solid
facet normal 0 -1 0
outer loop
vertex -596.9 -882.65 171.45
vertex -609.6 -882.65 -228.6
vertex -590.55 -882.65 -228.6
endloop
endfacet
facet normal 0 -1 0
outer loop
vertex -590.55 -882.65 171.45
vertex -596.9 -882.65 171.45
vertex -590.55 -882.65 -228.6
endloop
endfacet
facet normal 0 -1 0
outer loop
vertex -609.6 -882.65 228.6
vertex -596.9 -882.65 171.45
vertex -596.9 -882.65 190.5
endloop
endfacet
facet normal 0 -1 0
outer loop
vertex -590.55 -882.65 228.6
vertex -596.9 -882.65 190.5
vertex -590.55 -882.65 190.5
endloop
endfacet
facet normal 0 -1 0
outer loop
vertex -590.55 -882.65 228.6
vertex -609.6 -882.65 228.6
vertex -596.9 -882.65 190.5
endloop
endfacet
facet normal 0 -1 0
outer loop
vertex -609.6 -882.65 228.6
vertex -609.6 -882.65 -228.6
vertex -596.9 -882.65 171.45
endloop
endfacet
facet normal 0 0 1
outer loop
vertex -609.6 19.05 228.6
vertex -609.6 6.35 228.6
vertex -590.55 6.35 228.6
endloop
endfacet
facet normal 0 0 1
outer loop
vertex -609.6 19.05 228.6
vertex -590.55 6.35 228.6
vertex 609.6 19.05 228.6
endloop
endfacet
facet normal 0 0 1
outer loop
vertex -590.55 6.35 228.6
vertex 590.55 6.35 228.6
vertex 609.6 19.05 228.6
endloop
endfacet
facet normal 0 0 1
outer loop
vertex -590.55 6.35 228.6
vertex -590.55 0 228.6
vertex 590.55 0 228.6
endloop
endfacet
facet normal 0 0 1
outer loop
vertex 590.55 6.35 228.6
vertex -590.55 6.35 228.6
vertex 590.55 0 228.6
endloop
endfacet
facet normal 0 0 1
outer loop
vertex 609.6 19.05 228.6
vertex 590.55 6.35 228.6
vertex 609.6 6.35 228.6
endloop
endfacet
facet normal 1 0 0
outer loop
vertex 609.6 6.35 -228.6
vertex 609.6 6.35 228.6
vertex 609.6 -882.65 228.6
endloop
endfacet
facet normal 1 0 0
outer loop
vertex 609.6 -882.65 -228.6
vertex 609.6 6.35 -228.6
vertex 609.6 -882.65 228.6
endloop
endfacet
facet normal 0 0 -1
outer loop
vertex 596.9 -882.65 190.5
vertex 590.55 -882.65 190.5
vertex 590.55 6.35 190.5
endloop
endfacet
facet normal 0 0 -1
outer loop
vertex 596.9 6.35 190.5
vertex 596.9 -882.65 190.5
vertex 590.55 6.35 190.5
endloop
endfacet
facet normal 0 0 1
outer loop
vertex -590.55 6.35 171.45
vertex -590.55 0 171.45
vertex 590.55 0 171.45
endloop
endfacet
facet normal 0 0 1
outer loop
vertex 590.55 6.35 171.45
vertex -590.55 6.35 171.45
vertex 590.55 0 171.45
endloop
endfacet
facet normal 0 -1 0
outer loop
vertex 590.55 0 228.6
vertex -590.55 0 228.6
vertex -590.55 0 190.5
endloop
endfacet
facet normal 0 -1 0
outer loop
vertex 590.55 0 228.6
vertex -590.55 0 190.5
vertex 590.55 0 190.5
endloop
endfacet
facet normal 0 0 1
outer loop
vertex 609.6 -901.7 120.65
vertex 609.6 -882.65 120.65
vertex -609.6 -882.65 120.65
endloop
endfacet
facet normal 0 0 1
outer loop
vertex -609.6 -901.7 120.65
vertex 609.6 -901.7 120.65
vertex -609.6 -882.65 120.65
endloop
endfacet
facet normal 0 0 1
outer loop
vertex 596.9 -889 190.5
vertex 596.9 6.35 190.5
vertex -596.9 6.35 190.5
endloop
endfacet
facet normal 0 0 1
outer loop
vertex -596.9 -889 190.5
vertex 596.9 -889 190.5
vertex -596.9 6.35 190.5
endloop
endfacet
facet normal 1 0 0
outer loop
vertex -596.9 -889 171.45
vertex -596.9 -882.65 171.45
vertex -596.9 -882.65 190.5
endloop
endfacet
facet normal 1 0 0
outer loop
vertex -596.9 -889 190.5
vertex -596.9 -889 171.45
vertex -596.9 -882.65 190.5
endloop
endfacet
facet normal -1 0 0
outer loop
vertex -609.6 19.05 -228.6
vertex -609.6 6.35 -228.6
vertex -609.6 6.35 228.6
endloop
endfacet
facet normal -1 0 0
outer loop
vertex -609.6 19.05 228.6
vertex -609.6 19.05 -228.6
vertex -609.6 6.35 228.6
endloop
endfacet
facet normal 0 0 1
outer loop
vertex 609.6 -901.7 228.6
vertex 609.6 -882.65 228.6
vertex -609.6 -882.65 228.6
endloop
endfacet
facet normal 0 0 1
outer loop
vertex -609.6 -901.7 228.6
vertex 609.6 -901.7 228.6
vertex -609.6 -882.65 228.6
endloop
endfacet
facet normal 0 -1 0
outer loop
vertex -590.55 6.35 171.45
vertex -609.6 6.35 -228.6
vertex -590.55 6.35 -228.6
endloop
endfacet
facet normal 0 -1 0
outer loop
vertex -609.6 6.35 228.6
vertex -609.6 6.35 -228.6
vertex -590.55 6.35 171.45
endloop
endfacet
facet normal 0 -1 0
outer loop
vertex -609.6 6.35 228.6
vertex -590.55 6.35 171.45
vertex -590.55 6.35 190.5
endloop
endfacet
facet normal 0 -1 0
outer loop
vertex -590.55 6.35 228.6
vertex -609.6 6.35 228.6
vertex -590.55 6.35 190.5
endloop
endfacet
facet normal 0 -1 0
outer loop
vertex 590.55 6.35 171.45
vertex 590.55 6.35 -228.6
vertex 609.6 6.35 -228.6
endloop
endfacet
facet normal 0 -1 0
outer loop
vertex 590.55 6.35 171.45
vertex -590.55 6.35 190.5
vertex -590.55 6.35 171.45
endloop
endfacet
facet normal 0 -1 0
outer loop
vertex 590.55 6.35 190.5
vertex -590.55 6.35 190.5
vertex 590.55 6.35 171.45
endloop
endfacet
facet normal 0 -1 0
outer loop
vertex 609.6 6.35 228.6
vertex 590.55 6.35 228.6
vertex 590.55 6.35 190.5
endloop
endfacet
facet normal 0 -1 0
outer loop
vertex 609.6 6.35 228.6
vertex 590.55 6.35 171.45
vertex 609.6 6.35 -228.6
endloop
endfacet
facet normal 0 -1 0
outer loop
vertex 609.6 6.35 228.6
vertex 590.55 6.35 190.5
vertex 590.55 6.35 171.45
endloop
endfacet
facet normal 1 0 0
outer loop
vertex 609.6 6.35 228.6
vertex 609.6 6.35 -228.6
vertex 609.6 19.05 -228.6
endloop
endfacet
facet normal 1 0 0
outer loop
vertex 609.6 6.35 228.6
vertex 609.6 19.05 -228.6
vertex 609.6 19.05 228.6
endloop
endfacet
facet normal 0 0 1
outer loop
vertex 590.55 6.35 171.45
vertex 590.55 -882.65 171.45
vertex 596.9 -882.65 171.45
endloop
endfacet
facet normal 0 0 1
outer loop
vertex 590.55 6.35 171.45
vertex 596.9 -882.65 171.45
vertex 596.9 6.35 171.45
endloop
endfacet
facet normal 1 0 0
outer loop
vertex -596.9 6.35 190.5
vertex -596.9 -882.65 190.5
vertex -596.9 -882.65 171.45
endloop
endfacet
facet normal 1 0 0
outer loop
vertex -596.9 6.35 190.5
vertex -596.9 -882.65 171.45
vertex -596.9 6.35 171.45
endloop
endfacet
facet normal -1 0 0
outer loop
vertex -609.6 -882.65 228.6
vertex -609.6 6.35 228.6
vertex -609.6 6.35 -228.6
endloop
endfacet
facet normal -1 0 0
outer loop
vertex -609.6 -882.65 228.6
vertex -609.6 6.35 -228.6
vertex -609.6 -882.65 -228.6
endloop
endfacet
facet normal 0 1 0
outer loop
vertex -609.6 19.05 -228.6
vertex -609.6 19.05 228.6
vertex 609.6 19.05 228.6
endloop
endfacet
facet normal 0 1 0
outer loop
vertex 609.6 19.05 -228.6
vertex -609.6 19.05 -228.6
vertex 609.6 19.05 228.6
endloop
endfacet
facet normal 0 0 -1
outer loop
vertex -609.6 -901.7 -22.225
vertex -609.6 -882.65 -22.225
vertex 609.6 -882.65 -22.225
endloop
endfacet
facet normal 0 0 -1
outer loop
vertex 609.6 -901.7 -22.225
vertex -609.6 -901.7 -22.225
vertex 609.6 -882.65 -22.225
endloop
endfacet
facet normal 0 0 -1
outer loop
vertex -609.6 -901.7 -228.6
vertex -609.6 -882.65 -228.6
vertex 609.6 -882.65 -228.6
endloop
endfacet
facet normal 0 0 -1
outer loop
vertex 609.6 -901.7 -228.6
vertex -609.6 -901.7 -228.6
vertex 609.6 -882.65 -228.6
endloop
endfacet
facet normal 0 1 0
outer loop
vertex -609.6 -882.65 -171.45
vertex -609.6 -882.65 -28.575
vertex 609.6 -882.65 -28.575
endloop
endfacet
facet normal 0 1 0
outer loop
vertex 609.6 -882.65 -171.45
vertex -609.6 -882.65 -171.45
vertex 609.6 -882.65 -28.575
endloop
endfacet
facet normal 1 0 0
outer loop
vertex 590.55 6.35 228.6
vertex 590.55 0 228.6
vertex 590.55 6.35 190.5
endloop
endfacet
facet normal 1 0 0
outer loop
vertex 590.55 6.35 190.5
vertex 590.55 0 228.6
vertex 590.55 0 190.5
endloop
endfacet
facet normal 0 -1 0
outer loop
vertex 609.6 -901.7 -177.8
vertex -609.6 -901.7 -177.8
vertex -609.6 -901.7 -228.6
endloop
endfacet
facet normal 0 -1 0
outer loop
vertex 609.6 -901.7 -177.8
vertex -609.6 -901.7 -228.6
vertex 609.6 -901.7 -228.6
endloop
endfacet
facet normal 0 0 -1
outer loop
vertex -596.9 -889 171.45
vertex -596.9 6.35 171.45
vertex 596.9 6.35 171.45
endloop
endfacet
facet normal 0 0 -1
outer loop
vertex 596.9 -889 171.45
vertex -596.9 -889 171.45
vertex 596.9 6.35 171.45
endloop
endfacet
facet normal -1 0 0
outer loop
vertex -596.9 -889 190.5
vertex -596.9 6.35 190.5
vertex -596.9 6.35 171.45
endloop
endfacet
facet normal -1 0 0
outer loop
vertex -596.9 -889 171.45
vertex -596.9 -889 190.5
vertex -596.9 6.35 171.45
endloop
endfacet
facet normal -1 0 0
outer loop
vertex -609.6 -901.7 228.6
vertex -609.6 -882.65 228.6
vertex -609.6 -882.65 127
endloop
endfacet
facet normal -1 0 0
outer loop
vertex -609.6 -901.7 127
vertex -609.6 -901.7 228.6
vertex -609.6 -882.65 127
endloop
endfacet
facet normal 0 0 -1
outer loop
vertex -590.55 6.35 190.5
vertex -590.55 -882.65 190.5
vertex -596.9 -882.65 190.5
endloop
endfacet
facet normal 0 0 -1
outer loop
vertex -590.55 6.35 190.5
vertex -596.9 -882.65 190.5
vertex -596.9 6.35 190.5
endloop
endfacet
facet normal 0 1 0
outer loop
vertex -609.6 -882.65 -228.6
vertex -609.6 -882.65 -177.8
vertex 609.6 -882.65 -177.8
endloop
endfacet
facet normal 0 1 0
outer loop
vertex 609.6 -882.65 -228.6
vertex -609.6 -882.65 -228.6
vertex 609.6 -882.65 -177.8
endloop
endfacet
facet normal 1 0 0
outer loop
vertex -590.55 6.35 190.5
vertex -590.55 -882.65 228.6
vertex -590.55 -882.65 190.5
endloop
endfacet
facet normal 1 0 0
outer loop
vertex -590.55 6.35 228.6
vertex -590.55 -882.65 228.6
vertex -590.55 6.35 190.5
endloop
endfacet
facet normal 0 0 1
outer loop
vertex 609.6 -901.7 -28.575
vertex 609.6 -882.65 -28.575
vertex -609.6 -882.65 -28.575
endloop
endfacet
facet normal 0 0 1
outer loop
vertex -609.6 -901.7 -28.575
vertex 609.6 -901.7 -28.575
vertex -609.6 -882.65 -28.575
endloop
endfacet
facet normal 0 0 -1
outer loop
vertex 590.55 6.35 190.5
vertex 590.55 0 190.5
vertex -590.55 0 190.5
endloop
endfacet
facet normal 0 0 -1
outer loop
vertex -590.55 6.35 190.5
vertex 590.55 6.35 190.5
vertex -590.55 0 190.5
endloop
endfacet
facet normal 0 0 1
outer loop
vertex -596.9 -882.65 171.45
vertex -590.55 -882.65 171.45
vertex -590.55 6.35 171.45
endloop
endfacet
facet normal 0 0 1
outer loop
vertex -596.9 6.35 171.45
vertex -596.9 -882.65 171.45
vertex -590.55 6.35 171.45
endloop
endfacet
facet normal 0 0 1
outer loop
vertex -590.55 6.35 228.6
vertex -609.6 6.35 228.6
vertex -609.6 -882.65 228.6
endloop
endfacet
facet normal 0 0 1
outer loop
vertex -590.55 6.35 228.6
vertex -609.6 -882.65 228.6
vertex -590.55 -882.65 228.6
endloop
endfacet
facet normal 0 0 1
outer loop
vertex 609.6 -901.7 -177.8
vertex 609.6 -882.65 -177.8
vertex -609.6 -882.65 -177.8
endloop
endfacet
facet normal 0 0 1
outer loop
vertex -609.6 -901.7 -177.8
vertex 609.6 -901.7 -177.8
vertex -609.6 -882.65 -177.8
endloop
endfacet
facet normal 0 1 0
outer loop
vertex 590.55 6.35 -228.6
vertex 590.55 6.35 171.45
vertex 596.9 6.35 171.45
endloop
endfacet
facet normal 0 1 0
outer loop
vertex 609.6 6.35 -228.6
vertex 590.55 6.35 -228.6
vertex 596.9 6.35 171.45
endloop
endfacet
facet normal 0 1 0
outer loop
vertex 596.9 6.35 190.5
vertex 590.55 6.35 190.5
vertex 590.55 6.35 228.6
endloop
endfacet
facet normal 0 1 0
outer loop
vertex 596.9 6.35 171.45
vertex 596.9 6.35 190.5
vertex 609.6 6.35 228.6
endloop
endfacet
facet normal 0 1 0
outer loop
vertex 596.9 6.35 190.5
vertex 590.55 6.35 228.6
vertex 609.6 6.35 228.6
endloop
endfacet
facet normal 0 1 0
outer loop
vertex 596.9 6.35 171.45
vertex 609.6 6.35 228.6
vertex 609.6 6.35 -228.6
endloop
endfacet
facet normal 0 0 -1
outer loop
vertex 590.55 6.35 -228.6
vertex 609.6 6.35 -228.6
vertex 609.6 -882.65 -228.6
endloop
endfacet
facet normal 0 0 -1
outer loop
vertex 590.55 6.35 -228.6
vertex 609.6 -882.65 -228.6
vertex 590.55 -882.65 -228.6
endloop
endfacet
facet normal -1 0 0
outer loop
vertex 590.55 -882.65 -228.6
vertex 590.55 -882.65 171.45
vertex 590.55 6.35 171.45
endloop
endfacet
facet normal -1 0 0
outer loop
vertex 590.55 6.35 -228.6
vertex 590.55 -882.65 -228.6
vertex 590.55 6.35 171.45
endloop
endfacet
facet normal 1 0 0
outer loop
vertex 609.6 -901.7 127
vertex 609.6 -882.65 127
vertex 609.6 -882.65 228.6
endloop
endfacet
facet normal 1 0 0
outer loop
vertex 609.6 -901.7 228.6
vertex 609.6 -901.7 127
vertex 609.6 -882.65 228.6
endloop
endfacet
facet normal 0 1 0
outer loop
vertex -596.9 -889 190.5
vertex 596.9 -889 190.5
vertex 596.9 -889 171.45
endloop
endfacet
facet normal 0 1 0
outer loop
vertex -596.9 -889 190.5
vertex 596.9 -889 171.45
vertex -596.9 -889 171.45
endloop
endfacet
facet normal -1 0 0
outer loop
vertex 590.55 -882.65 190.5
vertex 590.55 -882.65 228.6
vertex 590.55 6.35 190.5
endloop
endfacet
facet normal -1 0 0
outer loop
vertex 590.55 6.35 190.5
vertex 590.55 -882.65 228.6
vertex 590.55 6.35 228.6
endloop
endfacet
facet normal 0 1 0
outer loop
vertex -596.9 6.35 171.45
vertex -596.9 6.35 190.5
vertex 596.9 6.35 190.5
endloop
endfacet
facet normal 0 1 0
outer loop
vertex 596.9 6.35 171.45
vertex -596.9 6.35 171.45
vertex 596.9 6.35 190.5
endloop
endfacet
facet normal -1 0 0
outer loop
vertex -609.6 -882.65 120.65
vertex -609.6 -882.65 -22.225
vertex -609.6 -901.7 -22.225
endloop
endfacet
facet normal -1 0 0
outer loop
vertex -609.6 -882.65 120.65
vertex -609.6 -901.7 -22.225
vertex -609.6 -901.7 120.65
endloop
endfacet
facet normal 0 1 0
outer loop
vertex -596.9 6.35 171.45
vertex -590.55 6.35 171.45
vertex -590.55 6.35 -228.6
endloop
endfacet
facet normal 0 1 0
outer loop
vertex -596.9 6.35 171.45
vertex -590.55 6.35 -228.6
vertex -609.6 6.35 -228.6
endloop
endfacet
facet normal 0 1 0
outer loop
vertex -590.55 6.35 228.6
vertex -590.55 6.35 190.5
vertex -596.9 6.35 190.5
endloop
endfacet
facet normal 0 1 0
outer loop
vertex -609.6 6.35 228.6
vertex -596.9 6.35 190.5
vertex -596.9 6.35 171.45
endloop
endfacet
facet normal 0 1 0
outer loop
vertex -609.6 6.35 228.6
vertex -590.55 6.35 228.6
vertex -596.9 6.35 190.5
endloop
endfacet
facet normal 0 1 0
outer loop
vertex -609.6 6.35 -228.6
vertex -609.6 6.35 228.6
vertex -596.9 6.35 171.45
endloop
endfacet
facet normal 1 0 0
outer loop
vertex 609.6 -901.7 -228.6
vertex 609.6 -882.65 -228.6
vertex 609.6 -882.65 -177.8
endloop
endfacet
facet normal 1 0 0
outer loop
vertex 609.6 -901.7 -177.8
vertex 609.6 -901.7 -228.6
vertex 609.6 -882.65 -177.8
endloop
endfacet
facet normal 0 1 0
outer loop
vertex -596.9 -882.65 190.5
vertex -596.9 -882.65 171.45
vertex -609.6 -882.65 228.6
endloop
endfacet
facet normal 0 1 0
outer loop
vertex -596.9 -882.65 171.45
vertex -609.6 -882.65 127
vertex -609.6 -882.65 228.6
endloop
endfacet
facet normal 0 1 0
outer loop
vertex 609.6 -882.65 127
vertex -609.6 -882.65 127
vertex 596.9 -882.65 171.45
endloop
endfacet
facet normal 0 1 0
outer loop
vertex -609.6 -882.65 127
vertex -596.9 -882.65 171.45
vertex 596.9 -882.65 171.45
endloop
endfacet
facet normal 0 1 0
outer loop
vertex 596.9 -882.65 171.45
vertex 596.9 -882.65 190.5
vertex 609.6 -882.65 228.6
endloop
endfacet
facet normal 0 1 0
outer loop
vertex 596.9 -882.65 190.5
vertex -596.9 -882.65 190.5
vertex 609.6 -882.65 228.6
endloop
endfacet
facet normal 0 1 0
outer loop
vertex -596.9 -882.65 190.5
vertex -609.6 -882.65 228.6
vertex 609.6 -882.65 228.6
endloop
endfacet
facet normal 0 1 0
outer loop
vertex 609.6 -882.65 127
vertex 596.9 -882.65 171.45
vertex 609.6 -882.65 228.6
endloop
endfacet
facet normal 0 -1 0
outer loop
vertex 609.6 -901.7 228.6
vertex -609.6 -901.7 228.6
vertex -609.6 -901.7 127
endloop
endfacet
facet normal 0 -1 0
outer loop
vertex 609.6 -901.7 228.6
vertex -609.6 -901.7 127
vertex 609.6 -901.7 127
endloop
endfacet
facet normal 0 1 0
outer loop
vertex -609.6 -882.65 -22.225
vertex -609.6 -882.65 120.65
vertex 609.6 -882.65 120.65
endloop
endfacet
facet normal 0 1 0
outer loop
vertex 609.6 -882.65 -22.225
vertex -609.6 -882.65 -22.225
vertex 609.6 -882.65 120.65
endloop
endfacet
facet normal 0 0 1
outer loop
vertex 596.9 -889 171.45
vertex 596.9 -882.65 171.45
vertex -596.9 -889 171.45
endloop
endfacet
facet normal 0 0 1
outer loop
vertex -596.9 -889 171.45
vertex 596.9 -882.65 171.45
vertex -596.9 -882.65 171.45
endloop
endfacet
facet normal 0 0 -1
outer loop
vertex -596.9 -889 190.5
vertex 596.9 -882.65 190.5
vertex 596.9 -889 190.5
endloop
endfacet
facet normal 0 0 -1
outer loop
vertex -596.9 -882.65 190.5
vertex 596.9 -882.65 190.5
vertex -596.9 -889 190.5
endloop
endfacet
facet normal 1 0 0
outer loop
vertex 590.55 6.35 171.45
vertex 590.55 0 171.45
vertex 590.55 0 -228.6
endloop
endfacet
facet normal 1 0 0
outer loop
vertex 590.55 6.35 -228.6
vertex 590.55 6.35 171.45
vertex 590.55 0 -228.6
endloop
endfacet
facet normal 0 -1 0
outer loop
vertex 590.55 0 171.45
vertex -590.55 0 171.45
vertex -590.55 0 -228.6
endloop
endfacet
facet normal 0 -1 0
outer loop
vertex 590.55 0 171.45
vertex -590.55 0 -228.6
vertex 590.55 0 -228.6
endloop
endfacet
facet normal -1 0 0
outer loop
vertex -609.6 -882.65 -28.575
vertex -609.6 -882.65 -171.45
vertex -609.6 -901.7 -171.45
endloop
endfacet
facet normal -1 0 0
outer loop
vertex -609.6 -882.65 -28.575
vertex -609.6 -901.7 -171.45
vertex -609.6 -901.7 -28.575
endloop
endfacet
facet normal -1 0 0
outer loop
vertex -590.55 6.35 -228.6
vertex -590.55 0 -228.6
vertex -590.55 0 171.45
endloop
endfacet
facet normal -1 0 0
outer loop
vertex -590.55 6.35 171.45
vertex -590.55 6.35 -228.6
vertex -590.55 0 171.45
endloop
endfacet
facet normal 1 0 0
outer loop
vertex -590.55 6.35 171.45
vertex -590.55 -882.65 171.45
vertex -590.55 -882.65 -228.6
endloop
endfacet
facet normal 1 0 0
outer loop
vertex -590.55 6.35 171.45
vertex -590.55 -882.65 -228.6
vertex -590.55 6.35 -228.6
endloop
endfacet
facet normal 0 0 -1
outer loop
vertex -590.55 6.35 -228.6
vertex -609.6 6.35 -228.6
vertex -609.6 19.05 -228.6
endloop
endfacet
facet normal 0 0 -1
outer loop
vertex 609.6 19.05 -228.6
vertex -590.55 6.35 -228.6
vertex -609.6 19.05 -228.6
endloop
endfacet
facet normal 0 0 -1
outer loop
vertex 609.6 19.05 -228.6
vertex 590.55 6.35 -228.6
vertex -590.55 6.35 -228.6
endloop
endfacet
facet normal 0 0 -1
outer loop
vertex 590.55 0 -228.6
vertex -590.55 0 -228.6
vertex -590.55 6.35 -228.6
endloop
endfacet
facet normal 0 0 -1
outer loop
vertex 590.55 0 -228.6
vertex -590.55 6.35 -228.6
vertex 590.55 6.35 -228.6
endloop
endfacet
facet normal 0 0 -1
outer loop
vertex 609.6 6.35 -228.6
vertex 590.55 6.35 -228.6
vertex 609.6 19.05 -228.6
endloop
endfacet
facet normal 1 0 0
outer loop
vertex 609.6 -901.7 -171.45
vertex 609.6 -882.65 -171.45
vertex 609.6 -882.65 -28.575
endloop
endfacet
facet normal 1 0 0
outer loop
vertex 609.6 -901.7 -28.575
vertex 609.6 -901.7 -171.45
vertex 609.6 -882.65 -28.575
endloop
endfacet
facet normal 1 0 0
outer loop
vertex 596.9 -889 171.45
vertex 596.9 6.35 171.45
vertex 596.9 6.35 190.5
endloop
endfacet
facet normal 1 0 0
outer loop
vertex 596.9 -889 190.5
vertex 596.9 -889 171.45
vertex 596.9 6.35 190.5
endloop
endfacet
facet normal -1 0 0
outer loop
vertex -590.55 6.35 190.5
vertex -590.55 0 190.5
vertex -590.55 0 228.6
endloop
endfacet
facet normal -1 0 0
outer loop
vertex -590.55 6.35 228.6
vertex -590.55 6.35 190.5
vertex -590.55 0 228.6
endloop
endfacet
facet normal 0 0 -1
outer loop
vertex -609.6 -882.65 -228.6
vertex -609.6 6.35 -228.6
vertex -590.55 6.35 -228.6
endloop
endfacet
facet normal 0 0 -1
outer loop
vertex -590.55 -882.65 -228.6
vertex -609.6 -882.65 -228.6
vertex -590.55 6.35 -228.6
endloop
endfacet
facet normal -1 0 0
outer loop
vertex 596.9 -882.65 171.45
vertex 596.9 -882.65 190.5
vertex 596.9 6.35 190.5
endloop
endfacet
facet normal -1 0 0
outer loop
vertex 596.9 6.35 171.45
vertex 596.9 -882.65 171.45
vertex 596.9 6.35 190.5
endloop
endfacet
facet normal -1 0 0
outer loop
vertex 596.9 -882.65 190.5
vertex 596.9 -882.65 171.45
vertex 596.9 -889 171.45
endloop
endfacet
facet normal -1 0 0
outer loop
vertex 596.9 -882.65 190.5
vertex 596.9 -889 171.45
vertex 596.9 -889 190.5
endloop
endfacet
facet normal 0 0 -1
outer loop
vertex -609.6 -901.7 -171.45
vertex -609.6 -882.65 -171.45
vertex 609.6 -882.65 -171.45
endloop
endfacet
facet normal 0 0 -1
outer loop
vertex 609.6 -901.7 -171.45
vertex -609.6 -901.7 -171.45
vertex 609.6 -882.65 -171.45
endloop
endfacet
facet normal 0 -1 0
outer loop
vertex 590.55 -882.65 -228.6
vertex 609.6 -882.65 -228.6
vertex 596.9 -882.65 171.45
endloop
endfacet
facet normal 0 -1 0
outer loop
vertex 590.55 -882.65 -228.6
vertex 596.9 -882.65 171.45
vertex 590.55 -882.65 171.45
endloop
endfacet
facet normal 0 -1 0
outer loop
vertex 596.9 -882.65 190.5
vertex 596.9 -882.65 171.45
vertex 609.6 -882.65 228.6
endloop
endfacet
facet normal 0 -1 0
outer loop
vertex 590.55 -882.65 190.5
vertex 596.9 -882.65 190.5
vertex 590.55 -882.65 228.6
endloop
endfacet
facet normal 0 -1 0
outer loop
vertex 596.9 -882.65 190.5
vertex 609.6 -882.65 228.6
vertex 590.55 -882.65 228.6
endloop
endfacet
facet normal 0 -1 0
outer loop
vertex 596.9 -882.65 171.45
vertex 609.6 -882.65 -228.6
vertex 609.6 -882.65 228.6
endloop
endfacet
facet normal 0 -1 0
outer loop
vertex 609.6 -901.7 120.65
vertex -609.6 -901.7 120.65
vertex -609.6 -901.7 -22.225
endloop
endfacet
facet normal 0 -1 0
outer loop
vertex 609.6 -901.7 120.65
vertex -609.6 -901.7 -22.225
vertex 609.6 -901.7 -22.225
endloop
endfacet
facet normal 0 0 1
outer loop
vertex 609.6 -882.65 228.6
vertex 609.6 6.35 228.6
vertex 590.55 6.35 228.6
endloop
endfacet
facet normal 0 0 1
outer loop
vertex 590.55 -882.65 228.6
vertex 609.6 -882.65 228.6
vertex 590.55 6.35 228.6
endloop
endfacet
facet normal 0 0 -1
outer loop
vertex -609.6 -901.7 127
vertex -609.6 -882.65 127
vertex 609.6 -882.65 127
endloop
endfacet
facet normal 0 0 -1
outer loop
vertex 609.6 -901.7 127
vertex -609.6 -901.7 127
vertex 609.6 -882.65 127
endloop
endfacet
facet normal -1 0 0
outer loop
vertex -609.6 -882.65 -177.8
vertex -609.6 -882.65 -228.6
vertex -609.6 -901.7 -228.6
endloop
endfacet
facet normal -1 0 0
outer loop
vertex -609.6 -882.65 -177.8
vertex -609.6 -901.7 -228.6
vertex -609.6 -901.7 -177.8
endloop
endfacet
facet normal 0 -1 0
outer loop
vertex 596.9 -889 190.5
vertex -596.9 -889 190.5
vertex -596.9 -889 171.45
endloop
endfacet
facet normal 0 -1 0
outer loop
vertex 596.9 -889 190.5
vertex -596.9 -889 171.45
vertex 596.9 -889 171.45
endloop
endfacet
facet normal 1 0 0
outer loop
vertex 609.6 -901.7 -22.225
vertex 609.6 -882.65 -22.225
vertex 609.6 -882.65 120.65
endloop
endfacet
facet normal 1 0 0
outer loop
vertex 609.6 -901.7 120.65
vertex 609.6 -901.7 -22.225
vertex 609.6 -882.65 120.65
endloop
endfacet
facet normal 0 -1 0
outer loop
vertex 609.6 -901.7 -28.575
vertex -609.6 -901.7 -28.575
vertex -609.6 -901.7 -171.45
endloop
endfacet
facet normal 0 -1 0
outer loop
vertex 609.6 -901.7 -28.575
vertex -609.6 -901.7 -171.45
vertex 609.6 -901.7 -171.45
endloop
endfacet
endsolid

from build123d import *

# Parameters (mm, degrees)
F0_W      = 1219.2
F0_H      = 457.2
F1_DEPTH  = 19.05
F3_DEPTH  = 6.35
F5_DEPTH  = 457.2
F6_W      = 889
F6_H      = 19.05
F7_DEPTH  = 6.35
F10_DEPTH = 19.05
F11_W     = 1193.8
F11_H     = 19.05
F12_DEPTH = 6.35
F13_W     = 1200.15
F13_H     = 50.8
F13_W_2   = 19.05
F14_DEPTH = 19.05
F16_DEPTH = 895.35
F17_W     = 1200.15
F17_H     = 142.875
F17_W_2   = 19.05
F18_DEPTH = 19.05


with BuildPart() as f1:
    # F0 (on Front) → F1 (new body)
    with BuildSketch(Plane.XZ):
        Rectangle(F0_W, F0_H)
    extrude(amount=-F1_DEPTH)

    # F2 (on face) → F3 (cut)
    with BuildSketch(Plane.XZ):
        Polygon((-590.55, 228.6), (-609.6, 228.6), (-609.6, 190.5), (-609.6, 171.45), (-609.6, -228.6), (-590.55, -228.6), (-590.55, 171.45), (590.55, 171.45), (590.55, -228.6), (609.6, -228.6), (609.6, 171.45), (609.6, 190.5), (609.6, 228.6), (590.55, 228.6), (590.55, 190.5), (-590.55, 190.5), align=None)
    extrude(amount=-F3_DEPTH, mode=Mode.SUBTRACT)


with BuildPart() as f5:
    # F4 (on face) → F5 (new body, through all)
    with BuildSketch(Plane.XY.offset(228.6)):
        Polygon((-590.55, 6.35), (-609.6, 6.35), (-609.6, -882.65), (-590.55, -882.65), (-590.55, 0), align=None)
    extrude(amount=-F5_DEPTH)

    # F6 (on face) → F7 (cut)
    with BuildSketch(Plane.YZ.offset(-590.55)):
        with Locations((-438.15, 180.975)):
            Rectangle(F6_W, F6_H)
    extrude(amount=-F7_DEPTH, mode=Mode.SUBTRACT)


with BuildPart() as f8_1:
    # F8: instance of F5
    add(f5.part.mirror(Plane.YZ))


with BuildPart() as f10:
    # F9 (on face) → F10 (new body)
    with BuildSketch(Plane.XZ.offset(882.65)):
        Polygon((609.6, 228.6), (-590.55, 228.6), (-590.55, 190.5), (-596.9, 190.5), (-596.9, 171.45), (-590.55, 171.45), (-590.55, 127), (609.6, 127), align=None)
        Polygon((-590.55, 228.6), (-609.6, 228.6), (-609.6, 127), (-590.55, 127), (-590.55, 171.45), (-596.9, 171.45), (-596.9, 190.5), (-590.55, 190.5), align=None)
    extrude(amount=F10_DEPTH)

    # F11 (on face) → F12 (cut)
    with BuildSketch(Plane(origin=(0, -882.65, 0), x_dir=(-1, 0, 0), z_dir=(0, 1, 0))):
        with Locations((0, 180.975)):
            Rectangle(F11_W, F11_H)
    extrude(amount=-F12_DEPTH, mode=Mode.SUBTRACT)


with BuildPart() as f14:
    # F13 (on face) → F14 (new body)
    with BuildSketch(Plane.XZ.offset(882.65)):
        with Locations((9.525, -203.2)):
            Rectangle(F13_W, F13_H)
        with Locations((-600.075, -203.2)):
            Rectangle(F13_W_2, F13_H)
    extrude(amount=F14_DEPTH)


with BuildPart() as f16:
    # F15 (on face) → F16 (new body, through all)
    with BuildSketch(Plane.XZ.offset(-6.35)):
        Polygon((-590.55, 190.5), (-596.9, 190.5), (-596.9, 171.45), (-590.55, 171.45), (590.55, 171.45), (596.9, 171.45), (596.9, 190.5), (590.55, 190.5), align=None)
    extrude(amount=F16_DEPTH)


with BuildPart() as f18:
    # F17 (on face) → F18 (new body)
    with BuildSketch(Plane.XZ.offset(882.65)):
        with Locations((9.525, 49.2125)):
            Rectangle(F17_W, F17_H)
        with Locations((-600.075, 49.2125)):
            Rectangle(F17_W_2, F17_H)
    extrude(amount=F18_DEPTH)


with BuildPart() as f18b:
    # F17 (on face) → F18, piece 2 (new body)
    with BuildSketch(Plane.XZ.offset(882.65)):
        with Locations((-600.075, -100.0125)):
            Rectangle(F17_W_2, F17_H)
        with Locations((9.525, -100.0125)):
            Rectangle(F17_W, F17_H)
    extrude(amount=F18_DEPTH)


solid = Compound([f1.part, f5.part, f8_1.part, f10.part, f14.part, f16.part, f18.part, f18b.part])
